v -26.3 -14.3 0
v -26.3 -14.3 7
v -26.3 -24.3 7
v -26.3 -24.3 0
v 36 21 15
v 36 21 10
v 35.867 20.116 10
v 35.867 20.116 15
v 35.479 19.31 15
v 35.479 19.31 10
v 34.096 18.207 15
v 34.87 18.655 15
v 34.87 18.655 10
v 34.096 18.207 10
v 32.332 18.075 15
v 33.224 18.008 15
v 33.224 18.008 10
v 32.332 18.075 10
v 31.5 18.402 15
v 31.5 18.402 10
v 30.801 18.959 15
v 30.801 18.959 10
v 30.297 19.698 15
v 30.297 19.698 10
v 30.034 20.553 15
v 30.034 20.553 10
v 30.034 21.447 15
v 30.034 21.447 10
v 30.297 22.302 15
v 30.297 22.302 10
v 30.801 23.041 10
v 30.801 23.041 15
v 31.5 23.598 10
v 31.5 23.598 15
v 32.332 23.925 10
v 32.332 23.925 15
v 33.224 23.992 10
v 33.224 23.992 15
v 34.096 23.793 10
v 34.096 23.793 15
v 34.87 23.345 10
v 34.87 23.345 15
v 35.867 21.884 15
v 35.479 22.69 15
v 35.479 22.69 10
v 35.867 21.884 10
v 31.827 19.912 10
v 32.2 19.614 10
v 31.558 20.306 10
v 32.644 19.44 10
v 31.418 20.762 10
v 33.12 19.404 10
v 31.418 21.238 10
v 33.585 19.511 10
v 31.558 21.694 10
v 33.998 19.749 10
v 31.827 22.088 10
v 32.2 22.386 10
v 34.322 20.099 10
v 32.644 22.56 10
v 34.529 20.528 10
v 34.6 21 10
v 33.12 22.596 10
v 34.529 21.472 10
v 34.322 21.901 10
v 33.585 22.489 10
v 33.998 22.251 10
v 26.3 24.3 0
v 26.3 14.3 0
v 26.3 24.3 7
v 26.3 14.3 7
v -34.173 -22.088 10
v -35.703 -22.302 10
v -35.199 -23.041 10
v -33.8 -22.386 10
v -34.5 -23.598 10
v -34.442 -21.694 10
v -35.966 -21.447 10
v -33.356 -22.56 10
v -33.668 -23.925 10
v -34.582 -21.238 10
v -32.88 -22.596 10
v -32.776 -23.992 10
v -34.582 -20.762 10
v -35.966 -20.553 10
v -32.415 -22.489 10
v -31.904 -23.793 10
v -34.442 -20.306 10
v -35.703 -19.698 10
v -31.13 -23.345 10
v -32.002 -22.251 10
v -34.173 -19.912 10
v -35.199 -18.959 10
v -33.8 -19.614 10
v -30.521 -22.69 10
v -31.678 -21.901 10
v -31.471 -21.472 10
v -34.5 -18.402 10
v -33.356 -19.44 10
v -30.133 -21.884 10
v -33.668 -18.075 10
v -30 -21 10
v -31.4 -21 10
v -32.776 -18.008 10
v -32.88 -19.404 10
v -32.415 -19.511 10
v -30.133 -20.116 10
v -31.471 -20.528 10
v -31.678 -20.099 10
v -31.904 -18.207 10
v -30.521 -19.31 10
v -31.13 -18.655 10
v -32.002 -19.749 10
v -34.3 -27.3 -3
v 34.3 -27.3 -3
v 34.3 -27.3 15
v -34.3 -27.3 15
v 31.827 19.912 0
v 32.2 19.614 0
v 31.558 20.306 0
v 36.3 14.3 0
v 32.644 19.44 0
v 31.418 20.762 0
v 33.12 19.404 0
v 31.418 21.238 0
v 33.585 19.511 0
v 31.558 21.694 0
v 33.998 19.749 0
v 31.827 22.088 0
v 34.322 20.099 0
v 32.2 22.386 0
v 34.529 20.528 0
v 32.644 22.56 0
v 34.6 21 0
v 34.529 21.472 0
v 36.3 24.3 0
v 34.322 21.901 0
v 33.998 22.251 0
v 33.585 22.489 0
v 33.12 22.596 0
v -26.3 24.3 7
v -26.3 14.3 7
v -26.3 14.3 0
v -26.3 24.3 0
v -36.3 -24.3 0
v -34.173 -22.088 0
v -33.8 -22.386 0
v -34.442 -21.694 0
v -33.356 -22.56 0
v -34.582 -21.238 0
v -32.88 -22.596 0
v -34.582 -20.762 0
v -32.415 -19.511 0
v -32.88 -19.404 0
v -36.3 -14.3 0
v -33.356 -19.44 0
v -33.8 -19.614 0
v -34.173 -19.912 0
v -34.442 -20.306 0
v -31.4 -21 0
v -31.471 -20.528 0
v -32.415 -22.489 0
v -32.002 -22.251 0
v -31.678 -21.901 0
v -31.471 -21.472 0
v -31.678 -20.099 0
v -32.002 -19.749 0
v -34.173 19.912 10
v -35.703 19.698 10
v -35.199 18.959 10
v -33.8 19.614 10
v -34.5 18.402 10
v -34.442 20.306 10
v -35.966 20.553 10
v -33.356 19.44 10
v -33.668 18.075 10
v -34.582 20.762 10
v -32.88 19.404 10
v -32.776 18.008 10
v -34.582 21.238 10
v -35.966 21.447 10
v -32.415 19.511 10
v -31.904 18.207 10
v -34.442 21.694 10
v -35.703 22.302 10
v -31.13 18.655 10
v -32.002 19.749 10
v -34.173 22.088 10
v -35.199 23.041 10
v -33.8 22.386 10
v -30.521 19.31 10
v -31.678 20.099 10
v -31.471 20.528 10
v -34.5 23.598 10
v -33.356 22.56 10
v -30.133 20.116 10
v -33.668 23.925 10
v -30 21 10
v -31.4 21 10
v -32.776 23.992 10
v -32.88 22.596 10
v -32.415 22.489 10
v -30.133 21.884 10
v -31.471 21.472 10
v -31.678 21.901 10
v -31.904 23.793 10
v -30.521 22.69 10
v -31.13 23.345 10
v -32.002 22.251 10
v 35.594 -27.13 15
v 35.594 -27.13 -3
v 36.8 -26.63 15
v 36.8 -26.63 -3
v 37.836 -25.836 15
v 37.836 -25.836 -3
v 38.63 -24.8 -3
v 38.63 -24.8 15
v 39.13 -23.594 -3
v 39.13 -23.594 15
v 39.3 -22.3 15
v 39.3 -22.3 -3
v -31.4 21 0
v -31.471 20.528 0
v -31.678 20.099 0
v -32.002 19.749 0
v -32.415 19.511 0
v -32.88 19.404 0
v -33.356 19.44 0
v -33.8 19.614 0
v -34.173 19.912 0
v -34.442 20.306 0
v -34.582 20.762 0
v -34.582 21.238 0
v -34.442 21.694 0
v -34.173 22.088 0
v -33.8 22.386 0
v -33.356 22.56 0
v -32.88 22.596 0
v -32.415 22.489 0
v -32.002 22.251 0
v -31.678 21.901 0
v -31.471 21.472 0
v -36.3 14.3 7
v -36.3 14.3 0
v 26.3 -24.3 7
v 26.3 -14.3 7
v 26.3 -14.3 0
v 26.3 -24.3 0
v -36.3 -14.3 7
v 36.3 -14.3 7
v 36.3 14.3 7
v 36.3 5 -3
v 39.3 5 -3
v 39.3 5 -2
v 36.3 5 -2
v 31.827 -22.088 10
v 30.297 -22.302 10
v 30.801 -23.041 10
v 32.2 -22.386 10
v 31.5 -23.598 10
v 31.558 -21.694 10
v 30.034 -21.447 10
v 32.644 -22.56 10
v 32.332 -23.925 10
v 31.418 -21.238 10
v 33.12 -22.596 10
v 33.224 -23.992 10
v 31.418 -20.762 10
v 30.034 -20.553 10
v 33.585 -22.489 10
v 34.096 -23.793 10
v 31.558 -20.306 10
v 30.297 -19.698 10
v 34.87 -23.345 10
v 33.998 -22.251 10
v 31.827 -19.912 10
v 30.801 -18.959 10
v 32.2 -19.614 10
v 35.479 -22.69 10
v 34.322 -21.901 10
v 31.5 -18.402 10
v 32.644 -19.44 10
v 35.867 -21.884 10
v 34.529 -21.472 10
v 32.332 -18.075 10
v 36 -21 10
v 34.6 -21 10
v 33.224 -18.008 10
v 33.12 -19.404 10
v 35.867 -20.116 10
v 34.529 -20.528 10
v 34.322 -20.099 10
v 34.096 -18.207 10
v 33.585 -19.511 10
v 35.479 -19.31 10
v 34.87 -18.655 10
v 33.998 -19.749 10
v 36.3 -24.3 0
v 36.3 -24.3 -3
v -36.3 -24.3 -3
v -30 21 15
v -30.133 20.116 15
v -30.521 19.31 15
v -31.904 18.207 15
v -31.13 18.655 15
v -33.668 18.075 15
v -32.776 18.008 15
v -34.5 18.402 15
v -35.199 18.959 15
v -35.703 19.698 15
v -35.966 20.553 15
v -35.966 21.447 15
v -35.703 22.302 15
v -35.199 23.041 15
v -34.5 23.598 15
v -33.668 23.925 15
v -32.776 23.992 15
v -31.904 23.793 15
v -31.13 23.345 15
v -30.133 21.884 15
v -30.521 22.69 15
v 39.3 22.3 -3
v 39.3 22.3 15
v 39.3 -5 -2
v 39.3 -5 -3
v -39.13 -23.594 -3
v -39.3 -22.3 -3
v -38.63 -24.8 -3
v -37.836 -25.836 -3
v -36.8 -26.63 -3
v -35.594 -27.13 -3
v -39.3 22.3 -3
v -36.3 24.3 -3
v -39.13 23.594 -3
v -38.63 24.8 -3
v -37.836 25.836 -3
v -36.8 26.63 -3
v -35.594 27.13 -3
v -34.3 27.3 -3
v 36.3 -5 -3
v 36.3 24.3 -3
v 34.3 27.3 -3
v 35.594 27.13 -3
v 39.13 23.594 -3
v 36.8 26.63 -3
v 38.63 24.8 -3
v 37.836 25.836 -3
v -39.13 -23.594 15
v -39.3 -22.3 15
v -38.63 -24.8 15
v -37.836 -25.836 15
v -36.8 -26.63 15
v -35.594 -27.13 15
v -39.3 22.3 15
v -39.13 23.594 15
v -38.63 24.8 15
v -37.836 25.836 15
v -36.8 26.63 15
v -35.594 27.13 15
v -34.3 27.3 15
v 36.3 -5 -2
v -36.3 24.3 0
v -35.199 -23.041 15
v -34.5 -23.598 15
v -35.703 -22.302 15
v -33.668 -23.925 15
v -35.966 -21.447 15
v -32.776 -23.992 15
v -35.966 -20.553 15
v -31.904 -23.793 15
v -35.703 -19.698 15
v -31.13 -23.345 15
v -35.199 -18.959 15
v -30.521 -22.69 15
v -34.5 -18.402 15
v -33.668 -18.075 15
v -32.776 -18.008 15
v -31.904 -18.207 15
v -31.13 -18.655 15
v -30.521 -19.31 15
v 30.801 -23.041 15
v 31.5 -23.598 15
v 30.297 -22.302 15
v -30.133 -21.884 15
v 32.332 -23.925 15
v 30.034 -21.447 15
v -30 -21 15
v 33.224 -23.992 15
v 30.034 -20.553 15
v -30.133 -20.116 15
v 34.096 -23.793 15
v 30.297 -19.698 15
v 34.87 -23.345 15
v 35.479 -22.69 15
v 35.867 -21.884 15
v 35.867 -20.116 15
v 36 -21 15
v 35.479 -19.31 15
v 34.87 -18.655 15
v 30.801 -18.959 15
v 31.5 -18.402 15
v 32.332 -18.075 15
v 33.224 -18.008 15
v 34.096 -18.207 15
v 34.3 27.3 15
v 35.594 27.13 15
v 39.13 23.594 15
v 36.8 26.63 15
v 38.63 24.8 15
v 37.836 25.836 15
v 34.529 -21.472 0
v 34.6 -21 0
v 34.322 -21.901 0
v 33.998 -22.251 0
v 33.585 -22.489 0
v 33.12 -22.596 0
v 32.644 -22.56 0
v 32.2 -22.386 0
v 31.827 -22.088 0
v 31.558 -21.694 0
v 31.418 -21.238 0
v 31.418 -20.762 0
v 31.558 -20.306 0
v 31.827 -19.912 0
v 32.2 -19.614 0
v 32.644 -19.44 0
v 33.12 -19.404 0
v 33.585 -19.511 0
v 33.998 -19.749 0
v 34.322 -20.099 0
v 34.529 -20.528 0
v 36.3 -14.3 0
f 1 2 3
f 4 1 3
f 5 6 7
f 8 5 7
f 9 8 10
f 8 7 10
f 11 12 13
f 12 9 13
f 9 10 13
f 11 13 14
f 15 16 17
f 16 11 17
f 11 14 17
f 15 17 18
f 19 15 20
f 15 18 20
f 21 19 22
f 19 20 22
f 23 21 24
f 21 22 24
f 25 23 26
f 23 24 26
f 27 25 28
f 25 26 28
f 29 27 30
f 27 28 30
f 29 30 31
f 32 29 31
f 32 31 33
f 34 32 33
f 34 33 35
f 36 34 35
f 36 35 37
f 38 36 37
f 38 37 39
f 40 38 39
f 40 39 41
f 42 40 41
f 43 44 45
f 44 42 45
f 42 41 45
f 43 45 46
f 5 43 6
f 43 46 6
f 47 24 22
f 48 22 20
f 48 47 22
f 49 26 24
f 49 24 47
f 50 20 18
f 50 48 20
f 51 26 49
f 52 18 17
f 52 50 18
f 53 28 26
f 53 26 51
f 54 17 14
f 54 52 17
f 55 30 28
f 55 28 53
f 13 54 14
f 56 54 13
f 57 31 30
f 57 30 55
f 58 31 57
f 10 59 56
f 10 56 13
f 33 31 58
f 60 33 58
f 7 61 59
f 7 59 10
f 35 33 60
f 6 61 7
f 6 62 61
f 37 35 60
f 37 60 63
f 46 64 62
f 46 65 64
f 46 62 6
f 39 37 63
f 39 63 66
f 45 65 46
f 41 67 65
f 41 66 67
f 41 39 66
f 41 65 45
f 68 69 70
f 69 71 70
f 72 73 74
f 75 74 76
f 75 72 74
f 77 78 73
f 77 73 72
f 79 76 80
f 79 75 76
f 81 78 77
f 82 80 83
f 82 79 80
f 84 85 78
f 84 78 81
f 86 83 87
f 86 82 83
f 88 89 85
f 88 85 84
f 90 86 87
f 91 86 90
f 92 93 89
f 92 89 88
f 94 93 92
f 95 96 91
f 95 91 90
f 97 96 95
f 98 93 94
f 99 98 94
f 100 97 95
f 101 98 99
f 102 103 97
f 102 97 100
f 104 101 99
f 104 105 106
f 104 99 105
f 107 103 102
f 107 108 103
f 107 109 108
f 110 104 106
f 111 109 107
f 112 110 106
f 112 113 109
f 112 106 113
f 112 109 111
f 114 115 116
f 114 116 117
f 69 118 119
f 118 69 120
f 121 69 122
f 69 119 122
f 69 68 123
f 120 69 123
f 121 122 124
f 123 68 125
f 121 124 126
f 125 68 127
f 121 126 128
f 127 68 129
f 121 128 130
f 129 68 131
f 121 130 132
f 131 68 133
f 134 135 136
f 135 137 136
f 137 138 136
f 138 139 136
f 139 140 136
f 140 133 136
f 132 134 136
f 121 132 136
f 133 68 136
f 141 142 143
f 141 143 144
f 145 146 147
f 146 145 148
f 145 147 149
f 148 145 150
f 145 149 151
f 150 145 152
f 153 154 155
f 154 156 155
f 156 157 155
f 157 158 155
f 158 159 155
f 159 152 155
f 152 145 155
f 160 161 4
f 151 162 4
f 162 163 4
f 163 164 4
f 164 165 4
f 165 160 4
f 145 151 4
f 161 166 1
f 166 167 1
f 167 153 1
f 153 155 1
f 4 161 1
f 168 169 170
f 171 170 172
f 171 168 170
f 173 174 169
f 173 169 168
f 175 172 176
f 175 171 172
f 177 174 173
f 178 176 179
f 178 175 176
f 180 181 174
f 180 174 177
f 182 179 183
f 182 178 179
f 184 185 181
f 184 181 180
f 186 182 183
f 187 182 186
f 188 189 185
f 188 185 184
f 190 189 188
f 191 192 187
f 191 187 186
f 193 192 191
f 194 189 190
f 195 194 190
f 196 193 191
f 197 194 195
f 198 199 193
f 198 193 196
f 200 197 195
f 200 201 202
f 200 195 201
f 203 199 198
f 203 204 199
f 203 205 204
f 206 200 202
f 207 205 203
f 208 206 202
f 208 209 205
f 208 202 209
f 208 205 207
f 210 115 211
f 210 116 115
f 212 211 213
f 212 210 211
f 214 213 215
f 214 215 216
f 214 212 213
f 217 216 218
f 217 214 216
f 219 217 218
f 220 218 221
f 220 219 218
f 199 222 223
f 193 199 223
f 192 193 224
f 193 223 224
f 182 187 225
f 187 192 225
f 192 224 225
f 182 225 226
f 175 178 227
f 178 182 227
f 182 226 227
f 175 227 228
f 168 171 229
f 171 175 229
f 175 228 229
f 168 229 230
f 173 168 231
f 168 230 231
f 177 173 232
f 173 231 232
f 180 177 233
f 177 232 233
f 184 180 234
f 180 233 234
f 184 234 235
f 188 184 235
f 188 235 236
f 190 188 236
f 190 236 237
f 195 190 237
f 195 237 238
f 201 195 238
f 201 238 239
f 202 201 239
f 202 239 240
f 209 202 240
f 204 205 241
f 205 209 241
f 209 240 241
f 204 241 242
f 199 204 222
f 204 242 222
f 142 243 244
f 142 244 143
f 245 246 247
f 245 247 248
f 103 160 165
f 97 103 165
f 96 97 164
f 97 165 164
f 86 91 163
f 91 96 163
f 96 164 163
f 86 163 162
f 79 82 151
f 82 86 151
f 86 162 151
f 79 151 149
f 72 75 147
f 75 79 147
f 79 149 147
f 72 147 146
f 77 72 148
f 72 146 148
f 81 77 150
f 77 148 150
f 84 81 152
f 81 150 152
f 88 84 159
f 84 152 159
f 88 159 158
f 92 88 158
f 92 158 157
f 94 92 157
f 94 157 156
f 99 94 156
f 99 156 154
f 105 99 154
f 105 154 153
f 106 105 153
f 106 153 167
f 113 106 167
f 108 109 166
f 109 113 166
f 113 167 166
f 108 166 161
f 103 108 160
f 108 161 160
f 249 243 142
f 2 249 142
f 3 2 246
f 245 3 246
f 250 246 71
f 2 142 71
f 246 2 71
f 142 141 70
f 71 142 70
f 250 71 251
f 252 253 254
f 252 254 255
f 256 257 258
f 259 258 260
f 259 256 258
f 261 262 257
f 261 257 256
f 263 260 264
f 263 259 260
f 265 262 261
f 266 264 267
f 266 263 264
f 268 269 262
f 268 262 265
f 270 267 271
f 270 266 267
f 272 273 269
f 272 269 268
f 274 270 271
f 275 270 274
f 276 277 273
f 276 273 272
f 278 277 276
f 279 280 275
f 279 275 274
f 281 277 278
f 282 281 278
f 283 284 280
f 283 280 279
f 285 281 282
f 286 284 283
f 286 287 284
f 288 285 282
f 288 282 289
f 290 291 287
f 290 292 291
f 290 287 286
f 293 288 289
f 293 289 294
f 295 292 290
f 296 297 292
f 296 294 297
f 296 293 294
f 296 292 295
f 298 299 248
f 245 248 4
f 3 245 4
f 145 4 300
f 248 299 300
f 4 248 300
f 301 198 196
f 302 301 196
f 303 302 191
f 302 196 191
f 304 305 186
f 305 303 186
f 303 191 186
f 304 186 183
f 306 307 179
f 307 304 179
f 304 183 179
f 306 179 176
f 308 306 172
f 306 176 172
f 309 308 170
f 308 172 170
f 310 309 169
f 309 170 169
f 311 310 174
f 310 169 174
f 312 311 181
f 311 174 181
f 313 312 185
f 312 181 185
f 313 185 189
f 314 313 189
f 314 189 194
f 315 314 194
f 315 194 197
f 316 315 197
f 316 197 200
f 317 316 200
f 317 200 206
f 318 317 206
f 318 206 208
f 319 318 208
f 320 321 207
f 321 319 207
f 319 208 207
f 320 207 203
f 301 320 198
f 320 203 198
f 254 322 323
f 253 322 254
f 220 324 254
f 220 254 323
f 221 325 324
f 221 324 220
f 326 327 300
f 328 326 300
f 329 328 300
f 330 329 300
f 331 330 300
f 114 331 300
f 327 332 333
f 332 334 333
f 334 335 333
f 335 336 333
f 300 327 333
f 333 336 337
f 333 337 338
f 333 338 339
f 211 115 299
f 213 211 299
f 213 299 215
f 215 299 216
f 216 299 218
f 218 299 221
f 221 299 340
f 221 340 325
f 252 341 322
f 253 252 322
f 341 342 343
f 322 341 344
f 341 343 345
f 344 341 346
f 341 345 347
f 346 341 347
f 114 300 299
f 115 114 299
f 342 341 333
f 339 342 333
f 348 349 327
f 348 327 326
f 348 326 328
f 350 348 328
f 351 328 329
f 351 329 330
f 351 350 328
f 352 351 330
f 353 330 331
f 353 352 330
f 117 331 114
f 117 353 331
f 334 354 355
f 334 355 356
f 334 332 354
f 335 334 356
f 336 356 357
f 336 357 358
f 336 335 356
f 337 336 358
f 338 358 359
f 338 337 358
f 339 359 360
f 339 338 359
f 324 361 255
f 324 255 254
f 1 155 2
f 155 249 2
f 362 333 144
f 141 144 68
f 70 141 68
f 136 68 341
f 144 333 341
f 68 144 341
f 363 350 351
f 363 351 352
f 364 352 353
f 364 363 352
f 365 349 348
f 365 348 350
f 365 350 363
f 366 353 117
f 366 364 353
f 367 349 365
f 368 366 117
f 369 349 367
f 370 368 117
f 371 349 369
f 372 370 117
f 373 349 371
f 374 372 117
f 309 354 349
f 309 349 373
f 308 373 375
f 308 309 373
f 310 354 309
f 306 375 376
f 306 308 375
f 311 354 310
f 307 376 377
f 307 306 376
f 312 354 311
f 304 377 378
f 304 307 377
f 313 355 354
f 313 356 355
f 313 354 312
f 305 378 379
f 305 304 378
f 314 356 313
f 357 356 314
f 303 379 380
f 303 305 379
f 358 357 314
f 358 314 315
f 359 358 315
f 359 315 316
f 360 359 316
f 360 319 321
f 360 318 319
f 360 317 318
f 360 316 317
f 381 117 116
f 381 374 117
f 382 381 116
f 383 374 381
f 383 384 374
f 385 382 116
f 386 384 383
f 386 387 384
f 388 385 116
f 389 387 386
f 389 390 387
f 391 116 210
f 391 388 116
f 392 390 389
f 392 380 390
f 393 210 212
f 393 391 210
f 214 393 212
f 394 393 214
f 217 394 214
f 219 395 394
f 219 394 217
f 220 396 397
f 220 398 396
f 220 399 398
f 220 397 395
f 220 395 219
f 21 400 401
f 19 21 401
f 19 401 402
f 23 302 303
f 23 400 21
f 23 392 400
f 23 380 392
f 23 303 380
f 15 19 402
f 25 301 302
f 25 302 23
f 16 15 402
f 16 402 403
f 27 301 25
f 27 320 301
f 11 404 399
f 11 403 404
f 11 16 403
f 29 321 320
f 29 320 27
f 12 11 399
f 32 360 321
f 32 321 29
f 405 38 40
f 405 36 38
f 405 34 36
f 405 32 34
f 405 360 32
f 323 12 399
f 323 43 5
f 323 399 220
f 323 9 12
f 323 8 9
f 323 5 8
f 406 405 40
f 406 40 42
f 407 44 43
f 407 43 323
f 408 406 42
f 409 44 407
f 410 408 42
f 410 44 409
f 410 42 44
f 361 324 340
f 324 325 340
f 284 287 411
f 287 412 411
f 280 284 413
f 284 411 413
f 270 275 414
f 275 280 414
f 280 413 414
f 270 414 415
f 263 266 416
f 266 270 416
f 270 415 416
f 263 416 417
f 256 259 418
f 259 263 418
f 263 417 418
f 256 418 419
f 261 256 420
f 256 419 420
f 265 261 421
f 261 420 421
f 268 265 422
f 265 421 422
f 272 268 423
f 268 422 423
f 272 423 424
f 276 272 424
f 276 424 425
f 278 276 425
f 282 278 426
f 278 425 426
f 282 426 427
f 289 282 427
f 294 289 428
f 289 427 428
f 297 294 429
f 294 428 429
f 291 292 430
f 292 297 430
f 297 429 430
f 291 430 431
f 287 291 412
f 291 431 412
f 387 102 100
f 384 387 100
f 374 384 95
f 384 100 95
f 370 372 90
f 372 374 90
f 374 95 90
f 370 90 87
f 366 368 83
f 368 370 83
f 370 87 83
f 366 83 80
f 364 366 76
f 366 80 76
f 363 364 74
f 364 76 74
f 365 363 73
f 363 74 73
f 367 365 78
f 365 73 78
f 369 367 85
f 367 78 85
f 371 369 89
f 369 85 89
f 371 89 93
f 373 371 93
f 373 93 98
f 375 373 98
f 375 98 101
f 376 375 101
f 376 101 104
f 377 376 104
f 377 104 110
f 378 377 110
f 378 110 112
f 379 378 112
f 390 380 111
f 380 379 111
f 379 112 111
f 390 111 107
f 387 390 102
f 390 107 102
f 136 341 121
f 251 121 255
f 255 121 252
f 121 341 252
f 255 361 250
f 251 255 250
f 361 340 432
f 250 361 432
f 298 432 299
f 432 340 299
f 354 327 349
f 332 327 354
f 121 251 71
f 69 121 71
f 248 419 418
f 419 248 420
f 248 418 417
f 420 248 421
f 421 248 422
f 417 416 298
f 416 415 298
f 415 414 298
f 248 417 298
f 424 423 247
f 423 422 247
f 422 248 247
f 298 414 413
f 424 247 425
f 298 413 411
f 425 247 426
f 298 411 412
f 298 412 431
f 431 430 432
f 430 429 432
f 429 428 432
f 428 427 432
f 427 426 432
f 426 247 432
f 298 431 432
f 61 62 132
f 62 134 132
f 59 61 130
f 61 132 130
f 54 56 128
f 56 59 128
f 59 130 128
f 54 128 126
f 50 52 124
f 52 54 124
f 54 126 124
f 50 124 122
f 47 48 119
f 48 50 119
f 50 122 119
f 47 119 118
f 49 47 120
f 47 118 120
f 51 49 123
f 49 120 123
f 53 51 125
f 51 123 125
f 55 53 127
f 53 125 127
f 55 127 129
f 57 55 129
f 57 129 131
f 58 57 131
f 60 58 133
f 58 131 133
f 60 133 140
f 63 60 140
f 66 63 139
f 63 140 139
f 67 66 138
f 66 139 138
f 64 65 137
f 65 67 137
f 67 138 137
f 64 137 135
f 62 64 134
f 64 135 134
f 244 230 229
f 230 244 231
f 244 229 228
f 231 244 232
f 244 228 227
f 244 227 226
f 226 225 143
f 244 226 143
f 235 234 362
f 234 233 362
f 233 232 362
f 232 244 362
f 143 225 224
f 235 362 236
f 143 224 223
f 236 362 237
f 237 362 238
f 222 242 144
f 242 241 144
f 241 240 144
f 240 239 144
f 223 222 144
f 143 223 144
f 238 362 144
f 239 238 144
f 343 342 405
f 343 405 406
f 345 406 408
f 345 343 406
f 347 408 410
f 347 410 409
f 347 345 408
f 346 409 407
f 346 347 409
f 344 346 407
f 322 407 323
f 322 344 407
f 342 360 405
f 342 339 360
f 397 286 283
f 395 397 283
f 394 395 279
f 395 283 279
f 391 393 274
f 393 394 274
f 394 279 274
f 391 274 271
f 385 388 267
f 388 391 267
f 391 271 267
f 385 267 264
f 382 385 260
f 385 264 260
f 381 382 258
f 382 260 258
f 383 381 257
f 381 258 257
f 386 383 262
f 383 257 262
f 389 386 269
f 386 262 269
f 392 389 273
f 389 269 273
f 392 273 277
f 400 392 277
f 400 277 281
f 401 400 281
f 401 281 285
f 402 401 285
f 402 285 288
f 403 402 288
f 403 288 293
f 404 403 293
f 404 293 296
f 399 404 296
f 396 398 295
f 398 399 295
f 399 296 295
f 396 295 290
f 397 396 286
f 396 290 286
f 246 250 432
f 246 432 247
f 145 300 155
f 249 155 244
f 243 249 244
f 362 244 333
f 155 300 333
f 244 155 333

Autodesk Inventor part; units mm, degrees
sketch "スケッチ1" plane through (0, 0, 0) normal (0, 0, 1) x (1, 0, 0)
  line L0 (36, 24) -> (36, -24) construction
  line L1 (-36, 24) -> (36, 24) construction
  line L2 (-36, -24) -> (-36, 24) construction
  line L3 (36, -24) -> (-36, -24) construction
  circle A0 centre (-33, 21) radius 1.5 construction
  circle A1 centre (-33, -21) radius 1.5 construction
  circle A2 centre (33, 21) radius 1.5 construction
  circle A3 centre (33, -21) radius 1.5 construction
  line L4 (-36.3, 24.3) -> (36.3, 24.3)
  line L5 (36.3, 24.3) -> (36.3, -24.3)
  line L6 (36.3, -24.3) -> (-36.3, -24.3)
  line L7 (-36.3, -24.3) -> (-36.3, 24.3)
  circle A4 centre (-33, -21) radius 1.6
  circle A5 centre (-33, 21) radius 1.6
  circle A6 centre (33, -21) radius 1.6
  circle A7 centre (33, 21) radius 1.6
  line L8 (-39.3, 27.3) -> (39.3, 27.3)
  line L9 (39.3, 27.3) -> (39.3, -27.3)
  line L10 (39.3, -27.3) -> (-39.3, -27.3)
  line L11 (-39.3, -27.3) -> (-39.3, 27.3)
  line L12 (-36.3, -14.3) -> (-26.3, -14.3)
  line L13 (-26.3, -14.3) -> (-26.3, -24.3)
  line L14 (-55.02, 0) -> (55.02, 0) construction
  line L15 (0, -38.22) -> (0, 38.22) construction
  line L16 (-36.3, 14.3) -> (-26.3, 14.3)
  line L17 (-26.3, 14.3) -> (-26.3, 24.3)
  line L18 (36.3, -14.3) -> (26.3, -14.3)
  line L19 (26.3, -14.3) -> (26.3, -24.3)
  line L20 (26.3, 14.3) -> (26.3, 24.3)
  line L21 (36.3, 14.3) -> (26.3, 14.3)
  line L22 (22, 5) -> (29, 5) construction
  line L23 (29, -5) -> (22, -5) construction
  line L24 (36, 24) -> (36, -24) projected
  line L25 (36, -24) -> (-36, -24) projected
  line L26 (-36, -24) -> (-36, 24) projected
  line L27 (-36, 24) -> (36, 24) projected
  circle A8 centre (-33, 21) radius 1.5 projected
  circle A9 centre (-33, -21) radius 1.5 projected
  circle A10 centre (33, 21) radius 1.5 projected
  circle A11 centre (33, -21) radius 1.5 projected
  line L28 (39.3, 5) -> (36.3, 5)
  line L29 (39.3, -5) -> (36.3, -5)
  circle A12 centre (33, 21) radius 3
  circle A13 centre (33, -21) radius 3
  circle A14 centre (-33, 21) radius 3
  circle A15 centre (-33, -21) radius 3
  point P0 (0, 0)
  dimension "d0" = 0.3
  dimension "d1" = 3.2
  dimension "d2" = 3
  dimension "d7" = 10
  dimension "d16" = 6
extrude "押し出し1" add sketch "スケッチ1" along normal blind 7 and the other way blind 3 contours L7 L6 L5 L29 L9 L10 L11 L8 L28 L4 | L28 L9 L29 L5
ref_plane "作業平面1" through (-36, -24, 0) normal (0, 0, 1) x (1, 0, 0)
extrude "押し出し3" add sketch "スケッチ1" against normal up to surface (7 mm away) from surface at 7 contours L4 L17 L27 L26 L16 L7 | L4 L5 L21 L24 L27 L20 | L17 L16 L26 A14 L27 | L12 L26 L25 L13 L6 L7 | L27 A12 L24 L21 L20 | A14 L26 L27 | A14 | L12 L13 L25 A15 L26 | L27 L24 A12 | A12 | A15 L25 L26 | A15 | L19 L25 L24 L18 L5 L6 | L24 A13 L25 L19 L18 | A13 | L24 L25 A13
extrude "押し出し4" add sketch "スケッチ1" along normal blind 3 from surface at 7 contours L7 L6 L5 L29 L9 L10 L11 L8 L28 L4 | L4 L17 L27 L26 L16 L7 | L4 L20 L27 L17 | L16 L26 L12 L7 | L4 L5 L21 L24 L27 L20 | L27 L20 L21 L24 L18 L19 L25 L13 L12 L26 L16 L17 | L17 L16 L26 A14 L27 | L12 L26 L25 L13 L6 L7 | L27 A12 L24 L21 L20 | A14 L26 L27 | A14 | L12 L13 L25 A15 L26 | L5 L18 L24 L21 | L27 L24 A12 | A12 | L13 L25 L19 L6 | A15 L25 L26 | A15 | L28 L9 L29 L5 | L19 L25 L24 L18 L5 L6 | L24 A13 L25 L19 L18 | A13 | L24 L25 A13
ref_plane "作業平面2" through (-39.3, -27.3, -10) normal (0, 0, 1) x (1, 0, 0)
ref_plane "作業平面3" through (-36, -24, -2) normal (0, 0, -1) x (0, 1, 0)
sketch "スケッチ4" plane through (0, 0, 0) normal (0, 0, 1) x (1, 0, 0)
  line L0 (36.3, 24.3) -> (36.3, -24.3) projected
  line L1 (39.3, 27.3) -> (39.3, -27.3) projected
  line L2 (39.3, 5) -> (36.3, 5) projected
  line L3 (39.3, -5) -> (36.3, -5) projected
  point P0 (0, 0)
extrude "押し出し5" cut sketch "スケッチ4" along normal up to surface (8 mm away) from surface at -10
sketch "スケッチ5" plane through (-39.3, -27.3, 10) normal (0, 0, 1) x (1, 0, 0)
  circle A0 centre (6.3, 6.3) radius 3 projected
  circle A1 centre (72.3, 6.3) radius 3 projected
  circle A2 centre (72.3, 48.3) radius 3 projected
  circle A3 centre (6.3, 48.3) radius 3 projected
  line L0 (0, 0) -> (0, 54.6) projected
  line L1 (78.6, 0) -> (0, 0) projected
  line L2 (78.6, 54.6) -> (78.6, 0) projected
  line L3 (0, 54.6) -> (78.6, 54.6) projected
  circle A4 centre (72.3, 6.3) radius 1.6 projected
  circle A5 centre (6.3, 6.3) radius 1.6 projected
  circle A6 centre (6.3, 48.3) radius 1.6 projected
  circle A7 centre (72.3, 48.3) radius 1.6 projected
  point P0 (39.3, 27.3)
extrude "押し出し6" add sketch "スケッチ5" along normal blind 5 contours L0 L3 L2 L1
fillet "フィレット1" radius 5 4 edges at (-39.3, 27.3, 6) (-39.3, -27.3, 6) (39.3, 27.3, 6) (39.3, -27.3, 6)
properties part number "enclosure"
